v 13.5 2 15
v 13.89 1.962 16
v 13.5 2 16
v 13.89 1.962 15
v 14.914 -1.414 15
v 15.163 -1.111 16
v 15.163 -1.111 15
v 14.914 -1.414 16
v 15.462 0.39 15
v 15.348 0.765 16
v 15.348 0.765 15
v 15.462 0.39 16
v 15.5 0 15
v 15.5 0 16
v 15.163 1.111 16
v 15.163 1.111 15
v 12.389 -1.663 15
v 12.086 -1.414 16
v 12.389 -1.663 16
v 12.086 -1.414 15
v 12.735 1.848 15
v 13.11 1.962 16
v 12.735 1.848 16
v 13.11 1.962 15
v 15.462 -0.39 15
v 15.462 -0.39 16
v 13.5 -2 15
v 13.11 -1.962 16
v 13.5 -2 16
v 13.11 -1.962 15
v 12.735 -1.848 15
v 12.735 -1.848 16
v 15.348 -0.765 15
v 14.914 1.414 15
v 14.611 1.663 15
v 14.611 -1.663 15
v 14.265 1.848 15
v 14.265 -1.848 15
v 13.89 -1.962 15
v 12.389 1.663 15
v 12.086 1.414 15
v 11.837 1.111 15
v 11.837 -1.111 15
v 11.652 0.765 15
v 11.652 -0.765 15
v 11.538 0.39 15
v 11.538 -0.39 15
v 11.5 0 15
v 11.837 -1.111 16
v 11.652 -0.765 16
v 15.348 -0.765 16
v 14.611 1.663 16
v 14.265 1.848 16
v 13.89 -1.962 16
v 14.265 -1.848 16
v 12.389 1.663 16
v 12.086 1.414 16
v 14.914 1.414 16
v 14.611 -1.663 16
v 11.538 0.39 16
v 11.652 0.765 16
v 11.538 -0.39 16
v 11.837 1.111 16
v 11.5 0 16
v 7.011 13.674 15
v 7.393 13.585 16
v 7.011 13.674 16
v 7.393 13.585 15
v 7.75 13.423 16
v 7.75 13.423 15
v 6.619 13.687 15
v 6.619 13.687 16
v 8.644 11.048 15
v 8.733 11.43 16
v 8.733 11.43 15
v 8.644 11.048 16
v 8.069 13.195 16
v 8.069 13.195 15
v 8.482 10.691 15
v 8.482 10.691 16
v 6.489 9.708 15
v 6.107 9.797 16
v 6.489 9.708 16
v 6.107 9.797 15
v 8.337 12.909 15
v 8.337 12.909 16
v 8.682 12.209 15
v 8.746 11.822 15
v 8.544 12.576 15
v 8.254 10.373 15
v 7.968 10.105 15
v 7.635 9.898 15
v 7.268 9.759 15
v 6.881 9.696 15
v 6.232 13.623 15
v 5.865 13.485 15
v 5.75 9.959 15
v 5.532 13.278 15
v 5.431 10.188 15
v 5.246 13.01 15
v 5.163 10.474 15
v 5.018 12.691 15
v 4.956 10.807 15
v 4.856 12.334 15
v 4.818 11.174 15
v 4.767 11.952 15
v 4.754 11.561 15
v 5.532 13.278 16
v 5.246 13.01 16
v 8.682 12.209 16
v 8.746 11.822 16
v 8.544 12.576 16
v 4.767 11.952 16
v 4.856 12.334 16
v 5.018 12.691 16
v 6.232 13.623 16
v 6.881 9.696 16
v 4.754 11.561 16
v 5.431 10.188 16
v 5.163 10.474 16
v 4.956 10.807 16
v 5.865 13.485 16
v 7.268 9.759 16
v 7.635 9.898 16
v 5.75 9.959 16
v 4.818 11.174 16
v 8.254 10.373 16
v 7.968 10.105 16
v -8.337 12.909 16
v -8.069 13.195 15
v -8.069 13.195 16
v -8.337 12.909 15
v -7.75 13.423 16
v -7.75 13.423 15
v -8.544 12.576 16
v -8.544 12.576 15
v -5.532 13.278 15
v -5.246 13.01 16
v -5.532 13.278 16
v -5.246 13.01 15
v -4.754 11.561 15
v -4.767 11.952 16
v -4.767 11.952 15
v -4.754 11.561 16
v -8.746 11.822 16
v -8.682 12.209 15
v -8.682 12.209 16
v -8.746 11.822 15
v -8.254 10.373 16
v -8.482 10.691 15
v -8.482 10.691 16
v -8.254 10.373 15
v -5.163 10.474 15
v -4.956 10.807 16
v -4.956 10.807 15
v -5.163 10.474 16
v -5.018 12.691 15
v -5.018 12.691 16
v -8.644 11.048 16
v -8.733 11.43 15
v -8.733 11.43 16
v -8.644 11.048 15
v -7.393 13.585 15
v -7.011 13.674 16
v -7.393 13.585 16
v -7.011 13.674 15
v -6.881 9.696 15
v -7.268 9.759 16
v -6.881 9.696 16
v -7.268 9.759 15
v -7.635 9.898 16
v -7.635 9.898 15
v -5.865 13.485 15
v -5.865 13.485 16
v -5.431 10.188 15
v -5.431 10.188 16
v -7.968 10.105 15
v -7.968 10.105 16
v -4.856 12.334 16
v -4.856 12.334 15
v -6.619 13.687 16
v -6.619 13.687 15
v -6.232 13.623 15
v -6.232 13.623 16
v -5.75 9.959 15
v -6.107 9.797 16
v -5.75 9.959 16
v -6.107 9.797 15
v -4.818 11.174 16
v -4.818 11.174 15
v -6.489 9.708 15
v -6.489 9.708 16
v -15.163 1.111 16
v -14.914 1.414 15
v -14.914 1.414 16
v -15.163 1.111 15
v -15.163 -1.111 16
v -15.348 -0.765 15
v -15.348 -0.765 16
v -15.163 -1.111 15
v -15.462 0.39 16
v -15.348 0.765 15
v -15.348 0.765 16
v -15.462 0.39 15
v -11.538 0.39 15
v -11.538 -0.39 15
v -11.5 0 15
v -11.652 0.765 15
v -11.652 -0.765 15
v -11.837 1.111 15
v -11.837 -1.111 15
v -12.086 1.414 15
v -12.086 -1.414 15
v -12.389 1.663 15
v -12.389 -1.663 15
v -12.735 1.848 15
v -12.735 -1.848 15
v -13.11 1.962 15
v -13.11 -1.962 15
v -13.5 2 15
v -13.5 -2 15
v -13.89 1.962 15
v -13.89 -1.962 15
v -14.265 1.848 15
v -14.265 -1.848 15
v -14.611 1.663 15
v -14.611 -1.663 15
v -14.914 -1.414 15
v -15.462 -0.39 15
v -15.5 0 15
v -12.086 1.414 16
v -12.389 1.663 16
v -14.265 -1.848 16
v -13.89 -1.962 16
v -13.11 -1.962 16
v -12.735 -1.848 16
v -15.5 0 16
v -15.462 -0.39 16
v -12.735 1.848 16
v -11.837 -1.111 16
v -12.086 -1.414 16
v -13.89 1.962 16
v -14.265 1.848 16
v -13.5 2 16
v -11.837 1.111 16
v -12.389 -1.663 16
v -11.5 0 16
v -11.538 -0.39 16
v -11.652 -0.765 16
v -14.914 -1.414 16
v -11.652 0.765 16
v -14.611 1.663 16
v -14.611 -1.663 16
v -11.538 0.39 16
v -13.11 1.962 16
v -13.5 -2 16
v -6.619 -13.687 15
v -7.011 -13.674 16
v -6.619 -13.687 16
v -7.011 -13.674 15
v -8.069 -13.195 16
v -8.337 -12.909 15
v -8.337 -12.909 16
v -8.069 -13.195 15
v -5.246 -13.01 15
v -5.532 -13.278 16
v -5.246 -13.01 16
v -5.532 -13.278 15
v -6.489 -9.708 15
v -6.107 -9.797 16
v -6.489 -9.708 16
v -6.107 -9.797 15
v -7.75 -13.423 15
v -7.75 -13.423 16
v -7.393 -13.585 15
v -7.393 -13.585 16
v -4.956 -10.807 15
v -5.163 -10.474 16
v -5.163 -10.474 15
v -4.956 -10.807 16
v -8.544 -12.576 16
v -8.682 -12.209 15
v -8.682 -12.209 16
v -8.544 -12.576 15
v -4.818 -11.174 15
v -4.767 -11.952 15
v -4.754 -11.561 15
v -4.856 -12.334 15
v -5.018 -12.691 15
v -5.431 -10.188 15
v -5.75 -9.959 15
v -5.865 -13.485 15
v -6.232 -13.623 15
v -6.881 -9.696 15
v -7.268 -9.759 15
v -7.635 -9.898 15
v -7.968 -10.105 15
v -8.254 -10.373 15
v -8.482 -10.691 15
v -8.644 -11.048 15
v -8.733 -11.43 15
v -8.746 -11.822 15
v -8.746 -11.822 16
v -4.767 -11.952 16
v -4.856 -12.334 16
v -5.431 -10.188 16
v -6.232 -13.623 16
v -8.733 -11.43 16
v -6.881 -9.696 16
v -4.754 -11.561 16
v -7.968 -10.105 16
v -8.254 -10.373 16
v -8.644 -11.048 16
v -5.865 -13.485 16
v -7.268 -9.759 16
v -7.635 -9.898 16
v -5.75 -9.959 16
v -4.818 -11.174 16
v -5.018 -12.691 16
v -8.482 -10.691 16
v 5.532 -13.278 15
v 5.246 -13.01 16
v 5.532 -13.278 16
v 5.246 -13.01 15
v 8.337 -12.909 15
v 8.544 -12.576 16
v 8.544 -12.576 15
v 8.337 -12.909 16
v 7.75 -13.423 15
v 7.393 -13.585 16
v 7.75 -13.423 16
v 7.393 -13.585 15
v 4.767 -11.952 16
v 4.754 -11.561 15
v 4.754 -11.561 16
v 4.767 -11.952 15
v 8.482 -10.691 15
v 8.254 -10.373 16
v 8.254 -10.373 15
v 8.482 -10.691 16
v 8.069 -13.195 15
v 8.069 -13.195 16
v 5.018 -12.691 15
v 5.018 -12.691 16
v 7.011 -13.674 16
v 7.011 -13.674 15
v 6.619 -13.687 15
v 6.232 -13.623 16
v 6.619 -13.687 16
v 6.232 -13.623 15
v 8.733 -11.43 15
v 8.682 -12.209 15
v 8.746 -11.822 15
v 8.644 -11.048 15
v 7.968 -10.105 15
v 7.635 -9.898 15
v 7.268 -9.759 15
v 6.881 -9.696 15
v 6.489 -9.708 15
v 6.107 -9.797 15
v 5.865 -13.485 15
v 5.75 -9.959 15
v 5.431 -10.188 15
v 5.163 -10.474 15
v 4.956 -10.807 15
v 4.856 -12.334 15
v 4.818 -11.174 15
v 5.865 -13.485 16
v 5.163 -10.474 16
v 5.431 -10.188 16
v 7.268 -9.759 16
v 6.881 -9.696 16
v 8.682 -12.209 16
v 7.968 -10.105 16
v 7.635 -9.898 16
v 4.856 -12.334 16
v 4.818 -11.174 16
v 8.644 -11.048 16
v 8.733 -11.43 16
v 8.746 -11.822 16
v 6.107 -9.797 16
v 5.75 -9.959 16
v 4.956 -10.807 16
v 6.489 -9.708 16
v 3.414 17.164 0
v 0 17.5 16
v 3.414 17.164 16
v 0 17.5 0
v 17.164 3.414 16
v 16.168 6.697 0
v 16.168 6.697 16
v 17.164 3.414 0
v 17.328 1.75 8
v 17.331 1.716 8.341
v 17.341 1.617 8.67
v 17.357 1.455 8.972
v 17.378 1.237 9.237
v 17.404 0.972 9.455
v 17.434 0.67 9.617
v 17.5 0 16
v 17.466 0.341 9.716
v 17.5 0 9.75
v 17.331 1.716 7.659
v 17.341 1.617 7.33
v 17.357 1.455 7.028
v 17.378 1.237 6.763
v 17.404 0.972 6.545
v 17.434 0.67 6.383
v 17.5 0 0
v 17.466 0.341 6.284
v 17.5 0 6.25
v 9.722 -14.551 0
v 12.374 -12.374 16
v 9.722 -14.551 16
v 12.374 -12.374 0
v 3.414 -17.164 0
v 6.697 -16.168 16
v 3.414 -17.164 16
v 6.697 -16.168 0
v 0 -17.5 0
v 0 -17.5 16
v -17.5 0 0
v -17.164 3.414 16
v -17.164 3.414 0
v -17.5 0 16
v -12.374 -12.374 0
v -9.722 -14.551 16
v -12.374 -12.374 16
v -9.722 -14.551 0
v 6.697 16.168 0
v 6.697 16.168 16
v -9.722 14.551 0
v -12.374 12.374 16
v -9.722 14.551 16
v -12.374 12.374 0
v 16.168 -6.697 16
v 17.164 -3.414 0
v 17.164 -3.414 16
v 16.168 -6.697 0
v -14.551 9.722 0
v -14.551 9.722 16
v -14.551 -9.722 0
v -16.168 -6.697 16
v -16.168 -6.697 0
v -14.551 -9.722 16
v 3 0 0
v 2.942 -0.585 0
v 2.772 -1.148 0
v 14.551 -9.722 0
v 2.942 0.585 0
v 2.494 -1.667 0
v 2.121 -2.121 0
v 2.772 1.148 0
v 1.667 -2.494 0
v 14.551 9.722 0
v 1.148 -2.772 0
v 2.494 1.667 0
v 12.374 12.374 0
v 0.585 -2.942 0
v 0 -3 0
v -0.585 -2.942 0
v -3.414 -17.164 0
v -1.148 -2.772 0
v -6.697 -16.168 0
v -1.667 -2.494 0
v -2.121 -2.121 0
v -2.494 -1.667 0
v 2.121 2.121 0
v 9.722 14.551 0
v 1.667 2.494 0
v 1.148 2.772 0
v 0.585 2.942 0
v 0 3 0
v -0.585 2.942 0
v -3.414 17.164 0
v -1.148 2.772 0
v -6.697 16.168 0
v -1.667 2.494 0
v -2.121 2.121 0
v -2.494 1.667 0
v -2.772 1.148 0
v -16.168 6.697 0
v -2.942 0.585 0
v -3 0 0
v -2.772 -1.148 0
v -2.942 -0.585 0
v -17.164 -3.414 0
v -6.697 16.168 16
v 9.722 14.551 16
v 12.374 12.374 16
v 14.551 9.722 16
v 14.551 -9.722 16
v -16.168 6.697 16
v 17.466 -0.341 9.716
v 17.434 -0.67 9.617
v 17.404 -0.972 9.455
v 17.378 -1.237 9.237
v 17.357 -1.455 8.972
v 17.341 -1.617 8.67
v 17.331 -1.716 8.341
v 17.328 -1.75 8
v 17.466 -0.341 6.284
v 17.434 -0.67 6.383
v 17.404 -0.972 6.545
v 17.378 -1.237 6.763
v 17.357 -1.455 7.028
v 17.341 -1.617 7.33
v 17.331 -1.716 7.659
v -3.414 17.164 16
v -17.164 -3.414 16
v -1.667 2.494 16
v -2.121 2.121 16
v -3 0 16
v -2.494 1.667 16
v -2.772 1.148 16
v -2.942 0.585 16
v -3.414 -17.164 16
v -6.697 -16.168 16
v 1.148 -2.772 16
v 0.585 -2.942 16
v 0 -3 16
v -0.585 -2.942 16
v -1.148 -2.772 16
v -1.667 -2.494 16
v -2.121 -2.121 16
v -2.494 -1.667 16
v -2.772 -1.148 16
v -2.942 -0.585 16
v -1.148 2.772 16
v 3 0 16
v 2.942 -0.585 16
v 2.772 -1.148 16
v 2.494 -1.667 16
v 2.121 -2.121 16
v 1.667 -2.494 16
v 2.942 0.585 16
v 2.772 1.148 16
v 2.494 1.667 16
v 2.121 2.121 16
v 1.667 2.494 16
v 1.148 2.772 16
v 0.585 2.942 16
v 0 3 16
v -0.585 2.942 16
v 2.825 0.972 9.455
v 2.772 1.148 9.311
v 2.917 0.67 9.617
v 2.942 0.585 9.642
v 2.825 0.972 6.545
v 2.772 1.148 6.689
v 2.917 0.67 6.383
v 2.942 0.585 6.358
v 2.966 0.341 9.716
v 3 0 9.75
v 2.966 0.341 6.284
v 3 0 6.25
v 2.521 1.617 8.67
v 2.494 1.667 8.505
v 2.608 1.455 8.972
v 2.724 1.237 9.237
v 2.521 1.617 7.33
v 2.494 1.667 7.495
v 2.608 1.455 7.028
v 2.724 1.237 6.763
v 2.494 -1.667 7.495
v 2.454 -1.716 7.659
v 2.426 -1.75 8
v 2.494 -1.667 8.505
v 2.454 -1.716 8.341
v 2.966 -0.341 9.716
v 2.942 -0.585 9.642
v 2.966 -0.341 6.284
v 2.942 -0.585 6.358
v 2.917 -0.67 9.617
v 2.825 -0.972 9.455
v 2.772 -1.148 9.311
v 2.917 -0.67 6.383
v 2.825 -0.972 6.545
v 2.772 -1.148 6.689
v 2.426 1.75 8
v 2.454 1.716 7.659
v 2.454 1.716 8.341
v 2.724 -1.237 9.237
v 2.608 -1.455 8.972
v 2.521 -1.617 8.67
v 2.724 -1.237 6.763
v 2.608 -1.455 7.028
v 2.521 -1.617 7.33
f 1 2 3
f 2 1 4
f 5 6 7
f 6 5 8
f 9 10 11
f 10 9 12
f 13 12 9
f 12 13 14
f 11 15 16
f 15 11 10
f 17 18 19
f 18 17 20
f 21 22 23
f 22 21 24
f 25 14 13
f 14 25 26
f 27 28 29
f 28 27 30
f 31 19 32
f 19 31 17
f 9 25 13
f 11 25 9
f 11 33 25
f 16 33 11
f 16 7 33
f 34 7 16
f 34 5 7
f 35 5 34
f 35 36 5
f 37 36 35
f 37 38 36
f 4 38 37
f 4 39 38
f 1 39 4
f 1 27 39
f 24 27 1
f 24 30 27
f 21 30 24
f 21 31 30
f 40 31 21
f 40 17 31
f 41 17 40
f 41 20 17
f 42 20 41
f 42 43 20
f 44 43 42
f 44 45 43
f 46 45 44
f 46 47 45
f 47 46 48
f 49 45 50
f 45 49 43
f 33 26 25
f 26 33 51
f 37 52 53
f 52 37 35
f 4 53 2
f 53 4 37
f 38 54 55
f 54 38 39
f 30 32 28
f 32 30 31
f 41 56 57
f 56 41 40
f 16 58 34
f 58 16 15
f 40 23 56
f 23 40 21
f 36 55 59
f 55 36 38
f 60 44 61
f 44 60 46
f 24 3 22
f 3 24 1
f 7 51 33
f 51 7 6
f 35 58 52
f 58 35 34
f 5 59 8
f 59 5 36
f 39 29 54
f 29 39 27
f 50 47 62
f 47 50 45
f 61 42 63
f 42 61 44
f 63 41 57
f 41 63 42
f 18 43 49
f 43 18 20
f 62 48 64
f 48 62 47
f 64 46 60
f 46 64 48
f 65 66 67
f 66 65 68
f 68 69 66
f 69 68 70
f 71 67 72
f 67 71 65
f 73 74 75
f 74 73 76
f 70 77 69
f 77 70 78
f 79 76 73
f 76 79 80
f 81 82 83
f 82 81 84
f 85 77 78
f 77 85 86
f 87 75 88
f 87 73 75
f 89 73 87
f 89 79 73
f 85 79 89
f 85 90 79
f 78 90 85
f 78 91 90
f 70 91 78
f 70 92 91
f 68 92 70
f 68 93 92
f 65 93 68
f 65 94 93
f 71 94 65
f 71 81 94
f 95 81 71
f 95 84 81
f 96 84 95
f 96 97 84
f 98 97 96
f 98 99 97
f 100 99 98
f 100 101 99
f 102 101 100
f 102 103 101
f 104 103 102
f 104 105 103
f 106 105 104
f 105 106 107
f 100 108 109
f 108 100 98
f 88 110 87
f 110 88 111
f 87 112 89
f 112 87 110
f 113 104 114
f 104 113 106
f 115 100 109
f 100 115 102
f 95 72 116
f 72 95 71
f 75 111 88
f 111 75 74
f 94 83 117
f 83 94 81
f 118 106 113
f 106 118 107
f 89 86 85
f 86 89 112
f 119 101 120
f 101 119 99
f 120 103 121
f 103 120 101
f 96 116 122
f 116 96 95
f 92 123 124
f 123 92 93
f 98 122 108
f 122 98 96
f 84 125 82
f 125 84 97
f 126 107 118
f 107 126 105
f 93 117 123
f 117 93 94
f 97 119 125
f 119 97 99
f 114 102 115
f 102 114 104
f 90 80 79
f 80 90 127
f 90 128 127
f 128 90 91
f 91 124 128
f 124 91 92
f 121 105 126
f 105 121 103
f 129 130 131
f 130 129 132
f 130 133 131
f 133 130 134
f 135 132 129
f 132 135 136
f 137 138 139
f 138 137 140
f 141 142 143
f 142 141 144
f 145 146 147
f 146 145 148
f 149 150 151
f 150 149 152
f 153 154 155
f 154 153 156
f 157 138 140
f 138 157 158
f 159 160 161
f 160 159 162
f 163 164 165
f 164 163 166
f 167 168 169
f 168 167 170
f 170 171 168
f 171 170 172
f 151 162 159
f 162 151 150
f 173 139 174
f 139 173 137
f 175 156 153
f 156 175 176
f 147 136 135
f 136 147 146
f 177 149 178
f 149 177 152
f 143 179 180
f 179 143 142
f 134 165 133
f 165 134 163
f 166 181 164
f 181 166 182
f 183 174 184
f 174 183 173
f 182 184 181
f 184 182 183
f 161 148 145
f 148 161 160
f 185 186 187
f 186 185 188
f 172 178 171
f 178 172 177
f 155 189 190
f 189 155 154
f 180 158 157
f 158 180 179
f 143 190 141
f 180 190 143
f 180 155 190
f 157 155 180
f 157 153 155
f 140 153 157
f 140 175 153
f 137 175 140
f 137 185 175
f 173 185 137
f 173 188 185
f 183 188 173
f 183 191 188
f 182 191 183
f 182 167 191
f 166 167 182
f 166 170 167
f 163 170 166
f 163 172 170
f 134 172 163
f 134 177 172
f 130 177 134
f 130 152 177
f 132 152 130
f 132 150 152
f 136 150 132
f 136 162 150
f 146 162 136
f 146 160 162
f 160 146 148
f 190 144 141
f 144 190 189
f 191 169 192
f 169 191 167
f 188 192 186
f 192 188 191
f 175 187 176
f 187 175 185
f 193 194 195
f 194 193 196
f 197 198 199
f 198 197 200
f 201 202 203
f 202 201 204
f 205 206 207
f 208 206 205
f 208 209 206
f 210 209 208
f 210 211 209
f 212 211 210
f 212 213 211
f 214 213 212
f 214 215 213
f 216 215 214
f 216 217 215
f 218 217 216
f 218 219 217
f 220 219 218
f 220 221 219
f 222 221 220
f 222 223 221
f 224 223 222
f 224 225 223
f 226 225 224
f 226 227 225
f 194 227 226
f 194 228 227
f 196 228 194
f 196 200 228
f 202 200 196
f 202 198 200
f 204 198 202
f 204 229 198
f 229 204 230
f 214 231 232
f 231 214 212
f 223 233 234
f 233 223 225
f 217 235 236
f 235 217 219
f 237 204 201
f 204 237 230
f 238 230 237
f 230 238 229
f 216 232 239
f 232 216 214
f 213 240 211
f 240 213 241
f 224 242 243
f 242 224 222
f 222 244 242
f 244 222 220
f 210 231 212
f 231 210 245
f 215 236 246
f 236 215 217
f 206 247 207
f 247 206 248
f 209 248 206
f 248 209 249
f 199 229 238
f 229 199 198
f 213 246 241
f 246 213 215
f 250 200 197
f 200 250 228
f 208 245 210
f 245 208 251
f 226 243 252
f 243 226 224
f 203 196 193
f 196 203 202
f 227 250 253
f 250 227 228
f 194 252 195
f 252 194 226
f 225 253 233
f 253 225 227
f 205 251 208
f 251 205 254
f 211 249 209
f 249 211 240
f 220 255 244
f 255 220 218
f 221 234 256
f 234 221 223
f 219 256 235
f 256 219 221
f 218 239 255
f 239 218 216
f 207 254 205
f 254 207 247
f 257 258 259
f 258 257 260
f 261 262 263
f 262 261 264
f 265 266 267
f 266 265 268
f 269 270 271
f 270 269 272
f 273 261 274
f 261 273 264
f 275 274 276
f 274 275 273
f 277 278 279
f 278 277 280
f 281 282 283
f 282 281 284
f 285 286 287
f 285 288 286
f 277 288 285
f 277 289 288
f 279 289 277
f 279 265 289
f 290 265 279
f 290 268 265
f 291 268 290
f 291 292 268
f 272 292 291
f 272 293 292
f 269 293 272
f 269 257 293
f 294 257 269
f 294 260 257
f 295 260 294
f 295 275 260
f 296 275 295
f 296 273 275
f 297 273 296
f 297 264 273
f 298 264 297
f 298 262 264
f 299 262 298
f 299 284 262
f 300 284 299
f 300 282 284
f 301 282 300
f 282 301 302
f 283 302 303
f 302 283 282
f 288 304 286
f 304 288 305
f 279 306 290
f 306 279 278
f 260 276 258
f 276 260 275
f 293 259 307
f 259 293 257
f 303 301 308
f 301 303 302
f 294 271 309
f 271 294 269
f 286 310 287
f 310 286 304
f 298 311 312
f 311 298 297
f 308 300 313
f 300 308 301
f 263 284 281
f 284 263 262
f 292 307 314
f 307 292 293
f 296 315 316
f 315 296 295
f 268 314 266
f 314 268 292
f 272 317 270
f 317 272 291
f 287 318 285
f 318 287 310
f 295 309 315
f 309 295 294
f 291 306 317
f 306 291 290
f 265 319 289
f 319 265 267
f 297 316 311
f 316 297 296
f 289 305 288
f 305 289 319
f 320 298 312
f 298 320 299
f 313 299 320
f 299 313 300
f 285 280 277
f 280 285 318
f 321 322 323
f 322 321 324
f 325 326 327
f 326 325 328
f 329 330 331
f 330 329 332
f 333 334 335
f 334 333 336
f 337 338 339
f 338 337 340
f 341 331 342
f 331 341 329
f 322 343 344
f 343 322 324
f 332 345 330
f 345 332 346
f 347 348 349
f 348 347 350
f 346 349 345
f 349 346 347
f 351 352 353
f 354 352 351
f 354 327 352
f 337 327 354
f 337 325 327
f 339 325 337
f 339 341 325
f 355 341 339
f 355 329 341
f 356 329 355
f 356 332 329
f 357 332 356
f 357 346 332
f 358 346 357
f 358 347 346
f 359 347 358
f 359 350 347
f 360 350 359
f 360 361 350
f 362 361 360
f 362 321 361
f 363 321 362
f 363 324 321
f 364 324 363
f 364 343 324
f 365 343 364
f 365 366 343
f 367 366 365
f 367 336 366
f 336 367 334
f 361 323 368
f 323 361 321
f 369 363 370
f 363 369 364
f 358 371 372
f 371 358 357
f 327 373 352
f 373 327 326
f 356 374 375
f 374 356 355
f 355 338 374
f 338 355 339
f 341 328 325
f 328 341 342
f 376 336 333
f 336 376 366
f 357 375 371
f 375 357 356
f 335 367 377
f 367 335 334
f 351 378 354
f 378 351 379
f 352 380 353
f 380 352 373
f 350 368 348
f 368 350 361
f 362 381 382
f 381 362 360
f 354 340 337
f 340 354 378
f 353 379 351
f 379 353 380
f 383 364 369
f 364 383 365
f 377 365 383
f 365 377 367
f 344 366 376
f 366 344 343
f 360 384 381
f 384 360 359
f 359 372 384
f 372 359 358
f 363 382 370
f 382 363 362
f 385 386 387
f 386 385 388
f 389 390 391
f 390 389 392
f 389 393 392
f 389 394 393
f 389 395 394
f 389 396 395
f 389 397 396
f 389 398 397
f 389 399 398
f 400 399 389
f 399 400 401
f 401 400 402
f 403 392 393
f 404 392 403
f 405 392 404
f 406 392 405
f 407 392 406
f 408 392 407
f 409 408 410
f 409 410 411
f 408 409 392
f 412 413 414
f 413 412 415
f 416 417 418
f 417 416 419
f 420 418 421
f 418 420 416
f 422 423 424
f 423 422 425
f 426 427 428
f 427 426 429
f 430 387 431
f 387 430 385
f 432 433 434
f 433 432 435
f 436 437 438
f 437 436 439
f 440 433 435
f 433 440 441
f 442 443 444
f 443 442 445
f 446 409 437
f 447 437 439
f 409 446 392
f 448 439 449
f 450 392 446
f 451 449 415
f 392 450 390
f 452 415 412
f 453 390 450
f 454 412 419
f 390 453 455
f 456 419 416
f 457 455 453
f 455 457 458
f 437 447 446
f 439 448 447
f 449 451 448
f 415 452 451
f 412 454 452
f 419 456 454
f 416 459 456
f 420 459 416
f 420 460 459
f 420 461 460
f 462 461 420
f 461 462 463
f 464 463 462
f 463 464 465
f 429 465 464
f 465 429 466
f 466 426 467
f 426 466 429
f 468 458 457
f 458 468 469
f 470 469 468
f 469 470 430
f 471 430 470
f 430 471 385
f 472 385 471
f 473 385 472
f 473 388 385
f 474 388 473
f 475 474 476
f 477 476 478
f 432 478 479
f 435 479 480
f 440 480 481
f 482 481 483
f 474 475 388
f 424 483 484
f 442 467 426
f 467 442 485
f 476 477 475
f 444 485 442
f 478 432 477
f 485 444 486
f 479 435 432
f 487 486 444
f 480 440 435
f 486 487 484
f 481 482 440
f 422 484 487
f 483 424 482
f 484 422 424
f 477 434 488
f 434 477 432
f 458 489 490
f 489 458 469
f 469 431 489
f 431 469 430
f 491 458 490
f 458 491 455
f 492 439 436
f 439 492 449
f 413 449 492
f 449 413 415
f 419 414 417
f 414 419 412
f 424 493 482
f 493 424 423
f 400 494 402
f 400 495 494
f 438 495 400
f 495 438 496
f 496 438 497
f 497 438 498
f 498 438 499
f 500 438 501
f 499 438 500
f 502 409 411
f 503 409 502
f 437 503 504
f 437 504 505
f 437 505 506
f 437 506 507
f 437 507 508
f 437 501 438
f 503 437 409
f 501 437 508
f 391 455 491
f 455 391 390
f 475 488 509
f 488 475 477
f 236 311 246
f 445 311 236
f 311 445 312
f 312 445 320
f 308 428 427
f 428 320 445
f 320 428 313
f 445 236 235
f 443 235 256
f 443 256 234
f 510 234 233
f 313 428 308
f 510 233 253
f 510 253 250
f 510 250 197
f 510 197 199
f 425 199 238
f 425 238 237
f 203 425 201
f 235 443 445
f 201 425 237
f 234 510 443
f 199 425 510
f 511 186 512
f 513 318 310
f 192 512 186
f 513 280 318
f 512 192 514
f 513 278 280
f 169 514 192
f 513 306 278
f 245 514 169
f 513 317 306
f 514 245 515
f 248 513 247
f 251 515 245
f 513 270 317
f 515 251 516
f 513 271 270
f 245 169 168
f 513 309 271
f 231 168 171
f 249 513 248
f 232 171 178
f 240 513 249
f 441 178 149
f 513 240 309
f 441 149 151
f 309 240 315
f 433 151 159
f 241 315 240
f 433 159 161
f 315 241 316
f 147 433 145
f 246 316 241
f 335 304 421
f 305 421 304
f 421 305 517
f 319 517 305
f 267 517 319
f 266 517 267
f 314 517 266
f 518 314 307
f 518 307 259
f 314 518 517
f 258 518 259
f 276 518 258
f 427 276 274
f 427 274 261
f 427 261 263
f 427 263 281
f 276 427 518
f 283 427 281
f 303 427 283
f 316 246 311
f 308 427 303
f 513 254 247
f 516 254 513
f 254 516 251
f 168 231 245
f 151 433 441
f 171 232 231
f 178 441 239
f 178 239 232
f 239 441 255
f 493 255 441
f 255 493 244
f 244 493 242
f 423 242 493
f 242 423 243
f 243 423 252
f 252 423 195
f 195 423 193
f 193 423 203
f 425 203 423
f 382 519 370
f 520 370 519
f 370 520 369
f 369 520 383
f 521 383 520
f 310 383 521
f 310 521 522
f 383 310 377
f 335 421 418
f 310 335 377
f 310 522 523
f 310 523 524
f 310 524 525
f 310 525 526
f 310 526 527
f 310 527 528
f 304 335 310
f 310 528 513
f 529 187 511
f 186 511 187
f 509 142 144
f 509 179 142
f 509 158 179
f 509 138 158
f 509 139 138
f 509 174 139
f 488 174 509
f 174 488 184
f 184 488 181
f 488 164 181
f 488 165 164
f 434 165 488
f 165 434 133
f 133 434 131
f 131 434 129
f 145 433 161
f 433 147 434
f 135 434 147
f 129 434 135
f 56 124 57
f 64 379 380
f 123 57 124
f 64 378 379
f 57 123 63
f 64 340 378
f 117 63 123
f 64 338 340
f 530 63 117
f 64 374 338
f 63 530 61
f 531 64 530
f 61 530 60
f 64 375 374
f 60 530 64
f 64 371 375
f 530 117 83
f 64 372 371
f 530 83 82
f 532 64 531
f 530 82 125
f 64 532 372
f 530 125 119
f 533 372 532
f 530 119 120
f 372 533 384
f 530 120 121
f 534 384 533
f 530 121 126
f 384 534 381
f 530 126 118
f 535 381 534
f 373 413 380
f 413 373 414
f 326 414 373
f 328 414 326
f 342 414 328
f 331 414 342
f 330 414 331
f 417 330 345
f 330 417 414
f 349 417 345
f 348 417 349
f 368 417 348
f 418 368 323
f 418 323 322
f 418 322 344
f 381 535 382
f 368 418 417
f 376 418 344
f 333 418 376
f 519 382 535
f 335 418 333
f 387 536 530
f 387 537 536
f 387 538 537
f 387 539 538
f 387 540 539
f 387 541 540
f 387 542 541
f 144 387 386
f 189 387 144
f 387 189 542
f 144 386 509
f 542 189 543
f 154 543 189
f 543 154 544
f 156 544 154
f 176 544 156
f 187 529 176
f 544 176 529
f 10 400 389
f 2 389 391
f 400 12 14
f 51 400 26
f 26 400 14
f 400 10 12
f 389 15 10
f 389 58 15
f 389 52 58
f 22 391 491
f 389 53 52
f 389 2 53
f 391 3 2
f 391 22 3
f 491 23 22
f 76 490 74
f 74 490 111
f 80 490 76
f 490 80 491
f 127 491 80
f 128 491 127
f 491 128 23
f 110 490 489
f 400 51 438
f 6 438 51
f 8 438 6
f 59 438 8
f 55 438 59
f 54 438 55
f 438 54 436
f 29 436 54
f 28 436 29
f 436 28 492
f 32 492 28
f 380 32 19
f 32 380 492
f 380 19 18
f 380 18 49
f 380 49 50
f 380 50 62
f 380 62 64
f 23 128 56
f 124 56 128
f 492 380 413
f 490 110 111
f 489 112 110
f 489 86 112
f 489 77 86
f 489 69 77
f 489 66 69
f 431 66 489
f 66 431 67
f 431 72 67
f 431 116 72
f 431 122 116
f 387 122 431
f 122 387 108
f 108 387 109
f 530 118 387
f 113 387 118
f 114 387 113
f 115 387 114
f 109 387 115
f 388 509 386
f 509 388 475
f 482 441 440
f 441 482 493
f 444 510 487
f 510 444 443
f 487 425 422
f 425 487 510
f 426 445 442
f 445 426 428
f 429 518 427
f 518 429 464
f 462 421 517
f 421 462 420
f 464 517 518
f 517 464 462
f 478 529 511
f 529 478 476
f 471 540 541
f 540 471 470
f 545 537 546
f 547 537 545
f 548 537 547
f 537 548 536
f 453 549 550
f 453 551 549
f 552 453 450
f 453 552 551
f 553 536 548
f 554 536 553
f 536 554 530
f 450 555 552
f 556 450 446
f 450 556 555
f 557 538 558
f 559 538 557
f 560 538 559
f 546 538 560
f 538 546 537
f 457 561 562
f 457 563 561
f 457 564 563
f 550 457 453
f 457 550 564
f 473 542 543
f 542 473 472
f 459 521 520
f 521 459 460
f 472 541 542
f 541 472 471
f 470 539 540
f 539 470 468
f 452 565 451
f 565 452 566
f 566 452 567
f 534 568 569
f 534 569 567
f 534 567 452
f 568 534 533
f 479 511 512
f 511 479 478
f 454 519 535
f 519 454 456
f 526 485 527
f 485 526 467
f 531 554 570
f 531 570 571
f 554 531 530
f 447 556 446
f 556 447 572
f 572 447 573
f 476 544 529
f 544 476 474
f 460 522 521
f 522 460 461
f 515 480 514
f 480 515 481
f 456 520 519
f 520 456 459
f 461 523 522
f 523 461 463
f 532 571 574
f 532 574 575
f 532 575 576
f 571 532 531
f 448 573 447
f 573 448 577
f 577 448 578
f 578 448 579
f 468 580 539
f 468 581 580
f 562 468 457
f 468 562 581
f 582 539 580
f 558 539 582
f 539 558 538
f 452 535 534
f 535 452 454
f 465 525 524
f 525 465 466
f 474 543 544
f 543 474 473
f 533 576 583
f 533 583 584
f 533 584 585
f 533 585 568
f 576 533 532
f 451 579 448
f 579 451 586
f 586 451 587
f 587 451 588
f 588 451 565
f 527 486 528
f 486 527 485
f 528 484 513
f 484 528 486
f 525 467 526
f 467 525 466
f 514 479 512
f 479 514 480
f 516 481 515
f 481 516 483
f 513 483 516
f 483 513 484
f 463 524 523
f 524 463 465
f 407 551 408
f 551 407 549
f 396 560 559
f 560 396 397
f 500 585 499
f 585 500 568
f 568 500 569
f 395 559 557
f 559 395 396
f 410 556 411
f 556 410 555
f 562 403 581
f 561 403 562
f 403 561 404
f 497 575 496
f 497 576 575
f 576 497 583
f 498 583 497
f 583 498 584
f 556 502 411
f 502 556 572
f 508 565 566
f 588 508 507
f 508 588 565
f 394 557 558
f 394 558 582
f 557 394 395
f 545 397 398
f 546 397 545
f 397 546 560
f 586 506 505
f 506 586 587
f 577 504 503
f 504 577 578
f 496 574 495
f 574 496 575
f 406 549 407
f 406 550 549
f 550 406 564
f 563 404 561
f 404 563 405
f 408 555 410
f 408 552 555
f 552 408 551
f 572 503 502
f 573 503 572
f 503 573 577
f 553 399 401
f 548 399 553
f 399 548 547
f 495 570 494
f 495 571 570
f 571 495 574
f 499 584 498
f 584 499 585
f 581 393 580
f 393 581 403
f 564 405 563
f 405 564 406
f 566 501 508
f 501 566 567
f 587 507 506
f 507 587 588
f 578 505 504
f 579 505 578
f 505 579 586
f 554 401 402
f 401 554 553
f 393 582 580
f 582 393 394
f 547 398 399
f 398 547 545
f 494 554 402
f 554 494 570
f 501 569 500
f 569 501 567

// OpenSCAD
$fn = 32;

// ----------------------------------------------------------------------
// Control knob: dimpled knob
// ----------------------------------------------------------------------

// --- parameters (mm) ---
dimp_d = 4;               // finger dimple diameter
n_dimp = 6;               // number of dimples
dimp_r = 13.5;            // dimple ring radius
knob_d = 35;              // knob body diameter
knob_h = 16;              // knob body height
bore_d = 6;               // shaft bore diameter
set_d = 3.5;              // set screw bore diameter
fit_tol = 0.02;           // tolerance for press fits, mm
free_tol = 0.2;           // tolerance for clearance fits, mm

dimp_step = 360 / n_dimp;  // dimple angular step

difference() {
  cylinder(h = knob_h, d = knob_d);
  translate([0, 0, -1]) cylinder(h = knob_h + 2, d = bore_d);
  translate([-1, 0, knob_h / 2]) rotate([0, 90, 0])
    cylinder(h = knob_d / 2 + bore_d / 2 + 2, d = set_d);  for (i = [0 : n_dimp - 1])
    rotate([0, 0, i * dimp_step])
      translate([dimp_r, 0, knob_h - 1])
        cylinder(h = 2, d = dimp_d);
}
